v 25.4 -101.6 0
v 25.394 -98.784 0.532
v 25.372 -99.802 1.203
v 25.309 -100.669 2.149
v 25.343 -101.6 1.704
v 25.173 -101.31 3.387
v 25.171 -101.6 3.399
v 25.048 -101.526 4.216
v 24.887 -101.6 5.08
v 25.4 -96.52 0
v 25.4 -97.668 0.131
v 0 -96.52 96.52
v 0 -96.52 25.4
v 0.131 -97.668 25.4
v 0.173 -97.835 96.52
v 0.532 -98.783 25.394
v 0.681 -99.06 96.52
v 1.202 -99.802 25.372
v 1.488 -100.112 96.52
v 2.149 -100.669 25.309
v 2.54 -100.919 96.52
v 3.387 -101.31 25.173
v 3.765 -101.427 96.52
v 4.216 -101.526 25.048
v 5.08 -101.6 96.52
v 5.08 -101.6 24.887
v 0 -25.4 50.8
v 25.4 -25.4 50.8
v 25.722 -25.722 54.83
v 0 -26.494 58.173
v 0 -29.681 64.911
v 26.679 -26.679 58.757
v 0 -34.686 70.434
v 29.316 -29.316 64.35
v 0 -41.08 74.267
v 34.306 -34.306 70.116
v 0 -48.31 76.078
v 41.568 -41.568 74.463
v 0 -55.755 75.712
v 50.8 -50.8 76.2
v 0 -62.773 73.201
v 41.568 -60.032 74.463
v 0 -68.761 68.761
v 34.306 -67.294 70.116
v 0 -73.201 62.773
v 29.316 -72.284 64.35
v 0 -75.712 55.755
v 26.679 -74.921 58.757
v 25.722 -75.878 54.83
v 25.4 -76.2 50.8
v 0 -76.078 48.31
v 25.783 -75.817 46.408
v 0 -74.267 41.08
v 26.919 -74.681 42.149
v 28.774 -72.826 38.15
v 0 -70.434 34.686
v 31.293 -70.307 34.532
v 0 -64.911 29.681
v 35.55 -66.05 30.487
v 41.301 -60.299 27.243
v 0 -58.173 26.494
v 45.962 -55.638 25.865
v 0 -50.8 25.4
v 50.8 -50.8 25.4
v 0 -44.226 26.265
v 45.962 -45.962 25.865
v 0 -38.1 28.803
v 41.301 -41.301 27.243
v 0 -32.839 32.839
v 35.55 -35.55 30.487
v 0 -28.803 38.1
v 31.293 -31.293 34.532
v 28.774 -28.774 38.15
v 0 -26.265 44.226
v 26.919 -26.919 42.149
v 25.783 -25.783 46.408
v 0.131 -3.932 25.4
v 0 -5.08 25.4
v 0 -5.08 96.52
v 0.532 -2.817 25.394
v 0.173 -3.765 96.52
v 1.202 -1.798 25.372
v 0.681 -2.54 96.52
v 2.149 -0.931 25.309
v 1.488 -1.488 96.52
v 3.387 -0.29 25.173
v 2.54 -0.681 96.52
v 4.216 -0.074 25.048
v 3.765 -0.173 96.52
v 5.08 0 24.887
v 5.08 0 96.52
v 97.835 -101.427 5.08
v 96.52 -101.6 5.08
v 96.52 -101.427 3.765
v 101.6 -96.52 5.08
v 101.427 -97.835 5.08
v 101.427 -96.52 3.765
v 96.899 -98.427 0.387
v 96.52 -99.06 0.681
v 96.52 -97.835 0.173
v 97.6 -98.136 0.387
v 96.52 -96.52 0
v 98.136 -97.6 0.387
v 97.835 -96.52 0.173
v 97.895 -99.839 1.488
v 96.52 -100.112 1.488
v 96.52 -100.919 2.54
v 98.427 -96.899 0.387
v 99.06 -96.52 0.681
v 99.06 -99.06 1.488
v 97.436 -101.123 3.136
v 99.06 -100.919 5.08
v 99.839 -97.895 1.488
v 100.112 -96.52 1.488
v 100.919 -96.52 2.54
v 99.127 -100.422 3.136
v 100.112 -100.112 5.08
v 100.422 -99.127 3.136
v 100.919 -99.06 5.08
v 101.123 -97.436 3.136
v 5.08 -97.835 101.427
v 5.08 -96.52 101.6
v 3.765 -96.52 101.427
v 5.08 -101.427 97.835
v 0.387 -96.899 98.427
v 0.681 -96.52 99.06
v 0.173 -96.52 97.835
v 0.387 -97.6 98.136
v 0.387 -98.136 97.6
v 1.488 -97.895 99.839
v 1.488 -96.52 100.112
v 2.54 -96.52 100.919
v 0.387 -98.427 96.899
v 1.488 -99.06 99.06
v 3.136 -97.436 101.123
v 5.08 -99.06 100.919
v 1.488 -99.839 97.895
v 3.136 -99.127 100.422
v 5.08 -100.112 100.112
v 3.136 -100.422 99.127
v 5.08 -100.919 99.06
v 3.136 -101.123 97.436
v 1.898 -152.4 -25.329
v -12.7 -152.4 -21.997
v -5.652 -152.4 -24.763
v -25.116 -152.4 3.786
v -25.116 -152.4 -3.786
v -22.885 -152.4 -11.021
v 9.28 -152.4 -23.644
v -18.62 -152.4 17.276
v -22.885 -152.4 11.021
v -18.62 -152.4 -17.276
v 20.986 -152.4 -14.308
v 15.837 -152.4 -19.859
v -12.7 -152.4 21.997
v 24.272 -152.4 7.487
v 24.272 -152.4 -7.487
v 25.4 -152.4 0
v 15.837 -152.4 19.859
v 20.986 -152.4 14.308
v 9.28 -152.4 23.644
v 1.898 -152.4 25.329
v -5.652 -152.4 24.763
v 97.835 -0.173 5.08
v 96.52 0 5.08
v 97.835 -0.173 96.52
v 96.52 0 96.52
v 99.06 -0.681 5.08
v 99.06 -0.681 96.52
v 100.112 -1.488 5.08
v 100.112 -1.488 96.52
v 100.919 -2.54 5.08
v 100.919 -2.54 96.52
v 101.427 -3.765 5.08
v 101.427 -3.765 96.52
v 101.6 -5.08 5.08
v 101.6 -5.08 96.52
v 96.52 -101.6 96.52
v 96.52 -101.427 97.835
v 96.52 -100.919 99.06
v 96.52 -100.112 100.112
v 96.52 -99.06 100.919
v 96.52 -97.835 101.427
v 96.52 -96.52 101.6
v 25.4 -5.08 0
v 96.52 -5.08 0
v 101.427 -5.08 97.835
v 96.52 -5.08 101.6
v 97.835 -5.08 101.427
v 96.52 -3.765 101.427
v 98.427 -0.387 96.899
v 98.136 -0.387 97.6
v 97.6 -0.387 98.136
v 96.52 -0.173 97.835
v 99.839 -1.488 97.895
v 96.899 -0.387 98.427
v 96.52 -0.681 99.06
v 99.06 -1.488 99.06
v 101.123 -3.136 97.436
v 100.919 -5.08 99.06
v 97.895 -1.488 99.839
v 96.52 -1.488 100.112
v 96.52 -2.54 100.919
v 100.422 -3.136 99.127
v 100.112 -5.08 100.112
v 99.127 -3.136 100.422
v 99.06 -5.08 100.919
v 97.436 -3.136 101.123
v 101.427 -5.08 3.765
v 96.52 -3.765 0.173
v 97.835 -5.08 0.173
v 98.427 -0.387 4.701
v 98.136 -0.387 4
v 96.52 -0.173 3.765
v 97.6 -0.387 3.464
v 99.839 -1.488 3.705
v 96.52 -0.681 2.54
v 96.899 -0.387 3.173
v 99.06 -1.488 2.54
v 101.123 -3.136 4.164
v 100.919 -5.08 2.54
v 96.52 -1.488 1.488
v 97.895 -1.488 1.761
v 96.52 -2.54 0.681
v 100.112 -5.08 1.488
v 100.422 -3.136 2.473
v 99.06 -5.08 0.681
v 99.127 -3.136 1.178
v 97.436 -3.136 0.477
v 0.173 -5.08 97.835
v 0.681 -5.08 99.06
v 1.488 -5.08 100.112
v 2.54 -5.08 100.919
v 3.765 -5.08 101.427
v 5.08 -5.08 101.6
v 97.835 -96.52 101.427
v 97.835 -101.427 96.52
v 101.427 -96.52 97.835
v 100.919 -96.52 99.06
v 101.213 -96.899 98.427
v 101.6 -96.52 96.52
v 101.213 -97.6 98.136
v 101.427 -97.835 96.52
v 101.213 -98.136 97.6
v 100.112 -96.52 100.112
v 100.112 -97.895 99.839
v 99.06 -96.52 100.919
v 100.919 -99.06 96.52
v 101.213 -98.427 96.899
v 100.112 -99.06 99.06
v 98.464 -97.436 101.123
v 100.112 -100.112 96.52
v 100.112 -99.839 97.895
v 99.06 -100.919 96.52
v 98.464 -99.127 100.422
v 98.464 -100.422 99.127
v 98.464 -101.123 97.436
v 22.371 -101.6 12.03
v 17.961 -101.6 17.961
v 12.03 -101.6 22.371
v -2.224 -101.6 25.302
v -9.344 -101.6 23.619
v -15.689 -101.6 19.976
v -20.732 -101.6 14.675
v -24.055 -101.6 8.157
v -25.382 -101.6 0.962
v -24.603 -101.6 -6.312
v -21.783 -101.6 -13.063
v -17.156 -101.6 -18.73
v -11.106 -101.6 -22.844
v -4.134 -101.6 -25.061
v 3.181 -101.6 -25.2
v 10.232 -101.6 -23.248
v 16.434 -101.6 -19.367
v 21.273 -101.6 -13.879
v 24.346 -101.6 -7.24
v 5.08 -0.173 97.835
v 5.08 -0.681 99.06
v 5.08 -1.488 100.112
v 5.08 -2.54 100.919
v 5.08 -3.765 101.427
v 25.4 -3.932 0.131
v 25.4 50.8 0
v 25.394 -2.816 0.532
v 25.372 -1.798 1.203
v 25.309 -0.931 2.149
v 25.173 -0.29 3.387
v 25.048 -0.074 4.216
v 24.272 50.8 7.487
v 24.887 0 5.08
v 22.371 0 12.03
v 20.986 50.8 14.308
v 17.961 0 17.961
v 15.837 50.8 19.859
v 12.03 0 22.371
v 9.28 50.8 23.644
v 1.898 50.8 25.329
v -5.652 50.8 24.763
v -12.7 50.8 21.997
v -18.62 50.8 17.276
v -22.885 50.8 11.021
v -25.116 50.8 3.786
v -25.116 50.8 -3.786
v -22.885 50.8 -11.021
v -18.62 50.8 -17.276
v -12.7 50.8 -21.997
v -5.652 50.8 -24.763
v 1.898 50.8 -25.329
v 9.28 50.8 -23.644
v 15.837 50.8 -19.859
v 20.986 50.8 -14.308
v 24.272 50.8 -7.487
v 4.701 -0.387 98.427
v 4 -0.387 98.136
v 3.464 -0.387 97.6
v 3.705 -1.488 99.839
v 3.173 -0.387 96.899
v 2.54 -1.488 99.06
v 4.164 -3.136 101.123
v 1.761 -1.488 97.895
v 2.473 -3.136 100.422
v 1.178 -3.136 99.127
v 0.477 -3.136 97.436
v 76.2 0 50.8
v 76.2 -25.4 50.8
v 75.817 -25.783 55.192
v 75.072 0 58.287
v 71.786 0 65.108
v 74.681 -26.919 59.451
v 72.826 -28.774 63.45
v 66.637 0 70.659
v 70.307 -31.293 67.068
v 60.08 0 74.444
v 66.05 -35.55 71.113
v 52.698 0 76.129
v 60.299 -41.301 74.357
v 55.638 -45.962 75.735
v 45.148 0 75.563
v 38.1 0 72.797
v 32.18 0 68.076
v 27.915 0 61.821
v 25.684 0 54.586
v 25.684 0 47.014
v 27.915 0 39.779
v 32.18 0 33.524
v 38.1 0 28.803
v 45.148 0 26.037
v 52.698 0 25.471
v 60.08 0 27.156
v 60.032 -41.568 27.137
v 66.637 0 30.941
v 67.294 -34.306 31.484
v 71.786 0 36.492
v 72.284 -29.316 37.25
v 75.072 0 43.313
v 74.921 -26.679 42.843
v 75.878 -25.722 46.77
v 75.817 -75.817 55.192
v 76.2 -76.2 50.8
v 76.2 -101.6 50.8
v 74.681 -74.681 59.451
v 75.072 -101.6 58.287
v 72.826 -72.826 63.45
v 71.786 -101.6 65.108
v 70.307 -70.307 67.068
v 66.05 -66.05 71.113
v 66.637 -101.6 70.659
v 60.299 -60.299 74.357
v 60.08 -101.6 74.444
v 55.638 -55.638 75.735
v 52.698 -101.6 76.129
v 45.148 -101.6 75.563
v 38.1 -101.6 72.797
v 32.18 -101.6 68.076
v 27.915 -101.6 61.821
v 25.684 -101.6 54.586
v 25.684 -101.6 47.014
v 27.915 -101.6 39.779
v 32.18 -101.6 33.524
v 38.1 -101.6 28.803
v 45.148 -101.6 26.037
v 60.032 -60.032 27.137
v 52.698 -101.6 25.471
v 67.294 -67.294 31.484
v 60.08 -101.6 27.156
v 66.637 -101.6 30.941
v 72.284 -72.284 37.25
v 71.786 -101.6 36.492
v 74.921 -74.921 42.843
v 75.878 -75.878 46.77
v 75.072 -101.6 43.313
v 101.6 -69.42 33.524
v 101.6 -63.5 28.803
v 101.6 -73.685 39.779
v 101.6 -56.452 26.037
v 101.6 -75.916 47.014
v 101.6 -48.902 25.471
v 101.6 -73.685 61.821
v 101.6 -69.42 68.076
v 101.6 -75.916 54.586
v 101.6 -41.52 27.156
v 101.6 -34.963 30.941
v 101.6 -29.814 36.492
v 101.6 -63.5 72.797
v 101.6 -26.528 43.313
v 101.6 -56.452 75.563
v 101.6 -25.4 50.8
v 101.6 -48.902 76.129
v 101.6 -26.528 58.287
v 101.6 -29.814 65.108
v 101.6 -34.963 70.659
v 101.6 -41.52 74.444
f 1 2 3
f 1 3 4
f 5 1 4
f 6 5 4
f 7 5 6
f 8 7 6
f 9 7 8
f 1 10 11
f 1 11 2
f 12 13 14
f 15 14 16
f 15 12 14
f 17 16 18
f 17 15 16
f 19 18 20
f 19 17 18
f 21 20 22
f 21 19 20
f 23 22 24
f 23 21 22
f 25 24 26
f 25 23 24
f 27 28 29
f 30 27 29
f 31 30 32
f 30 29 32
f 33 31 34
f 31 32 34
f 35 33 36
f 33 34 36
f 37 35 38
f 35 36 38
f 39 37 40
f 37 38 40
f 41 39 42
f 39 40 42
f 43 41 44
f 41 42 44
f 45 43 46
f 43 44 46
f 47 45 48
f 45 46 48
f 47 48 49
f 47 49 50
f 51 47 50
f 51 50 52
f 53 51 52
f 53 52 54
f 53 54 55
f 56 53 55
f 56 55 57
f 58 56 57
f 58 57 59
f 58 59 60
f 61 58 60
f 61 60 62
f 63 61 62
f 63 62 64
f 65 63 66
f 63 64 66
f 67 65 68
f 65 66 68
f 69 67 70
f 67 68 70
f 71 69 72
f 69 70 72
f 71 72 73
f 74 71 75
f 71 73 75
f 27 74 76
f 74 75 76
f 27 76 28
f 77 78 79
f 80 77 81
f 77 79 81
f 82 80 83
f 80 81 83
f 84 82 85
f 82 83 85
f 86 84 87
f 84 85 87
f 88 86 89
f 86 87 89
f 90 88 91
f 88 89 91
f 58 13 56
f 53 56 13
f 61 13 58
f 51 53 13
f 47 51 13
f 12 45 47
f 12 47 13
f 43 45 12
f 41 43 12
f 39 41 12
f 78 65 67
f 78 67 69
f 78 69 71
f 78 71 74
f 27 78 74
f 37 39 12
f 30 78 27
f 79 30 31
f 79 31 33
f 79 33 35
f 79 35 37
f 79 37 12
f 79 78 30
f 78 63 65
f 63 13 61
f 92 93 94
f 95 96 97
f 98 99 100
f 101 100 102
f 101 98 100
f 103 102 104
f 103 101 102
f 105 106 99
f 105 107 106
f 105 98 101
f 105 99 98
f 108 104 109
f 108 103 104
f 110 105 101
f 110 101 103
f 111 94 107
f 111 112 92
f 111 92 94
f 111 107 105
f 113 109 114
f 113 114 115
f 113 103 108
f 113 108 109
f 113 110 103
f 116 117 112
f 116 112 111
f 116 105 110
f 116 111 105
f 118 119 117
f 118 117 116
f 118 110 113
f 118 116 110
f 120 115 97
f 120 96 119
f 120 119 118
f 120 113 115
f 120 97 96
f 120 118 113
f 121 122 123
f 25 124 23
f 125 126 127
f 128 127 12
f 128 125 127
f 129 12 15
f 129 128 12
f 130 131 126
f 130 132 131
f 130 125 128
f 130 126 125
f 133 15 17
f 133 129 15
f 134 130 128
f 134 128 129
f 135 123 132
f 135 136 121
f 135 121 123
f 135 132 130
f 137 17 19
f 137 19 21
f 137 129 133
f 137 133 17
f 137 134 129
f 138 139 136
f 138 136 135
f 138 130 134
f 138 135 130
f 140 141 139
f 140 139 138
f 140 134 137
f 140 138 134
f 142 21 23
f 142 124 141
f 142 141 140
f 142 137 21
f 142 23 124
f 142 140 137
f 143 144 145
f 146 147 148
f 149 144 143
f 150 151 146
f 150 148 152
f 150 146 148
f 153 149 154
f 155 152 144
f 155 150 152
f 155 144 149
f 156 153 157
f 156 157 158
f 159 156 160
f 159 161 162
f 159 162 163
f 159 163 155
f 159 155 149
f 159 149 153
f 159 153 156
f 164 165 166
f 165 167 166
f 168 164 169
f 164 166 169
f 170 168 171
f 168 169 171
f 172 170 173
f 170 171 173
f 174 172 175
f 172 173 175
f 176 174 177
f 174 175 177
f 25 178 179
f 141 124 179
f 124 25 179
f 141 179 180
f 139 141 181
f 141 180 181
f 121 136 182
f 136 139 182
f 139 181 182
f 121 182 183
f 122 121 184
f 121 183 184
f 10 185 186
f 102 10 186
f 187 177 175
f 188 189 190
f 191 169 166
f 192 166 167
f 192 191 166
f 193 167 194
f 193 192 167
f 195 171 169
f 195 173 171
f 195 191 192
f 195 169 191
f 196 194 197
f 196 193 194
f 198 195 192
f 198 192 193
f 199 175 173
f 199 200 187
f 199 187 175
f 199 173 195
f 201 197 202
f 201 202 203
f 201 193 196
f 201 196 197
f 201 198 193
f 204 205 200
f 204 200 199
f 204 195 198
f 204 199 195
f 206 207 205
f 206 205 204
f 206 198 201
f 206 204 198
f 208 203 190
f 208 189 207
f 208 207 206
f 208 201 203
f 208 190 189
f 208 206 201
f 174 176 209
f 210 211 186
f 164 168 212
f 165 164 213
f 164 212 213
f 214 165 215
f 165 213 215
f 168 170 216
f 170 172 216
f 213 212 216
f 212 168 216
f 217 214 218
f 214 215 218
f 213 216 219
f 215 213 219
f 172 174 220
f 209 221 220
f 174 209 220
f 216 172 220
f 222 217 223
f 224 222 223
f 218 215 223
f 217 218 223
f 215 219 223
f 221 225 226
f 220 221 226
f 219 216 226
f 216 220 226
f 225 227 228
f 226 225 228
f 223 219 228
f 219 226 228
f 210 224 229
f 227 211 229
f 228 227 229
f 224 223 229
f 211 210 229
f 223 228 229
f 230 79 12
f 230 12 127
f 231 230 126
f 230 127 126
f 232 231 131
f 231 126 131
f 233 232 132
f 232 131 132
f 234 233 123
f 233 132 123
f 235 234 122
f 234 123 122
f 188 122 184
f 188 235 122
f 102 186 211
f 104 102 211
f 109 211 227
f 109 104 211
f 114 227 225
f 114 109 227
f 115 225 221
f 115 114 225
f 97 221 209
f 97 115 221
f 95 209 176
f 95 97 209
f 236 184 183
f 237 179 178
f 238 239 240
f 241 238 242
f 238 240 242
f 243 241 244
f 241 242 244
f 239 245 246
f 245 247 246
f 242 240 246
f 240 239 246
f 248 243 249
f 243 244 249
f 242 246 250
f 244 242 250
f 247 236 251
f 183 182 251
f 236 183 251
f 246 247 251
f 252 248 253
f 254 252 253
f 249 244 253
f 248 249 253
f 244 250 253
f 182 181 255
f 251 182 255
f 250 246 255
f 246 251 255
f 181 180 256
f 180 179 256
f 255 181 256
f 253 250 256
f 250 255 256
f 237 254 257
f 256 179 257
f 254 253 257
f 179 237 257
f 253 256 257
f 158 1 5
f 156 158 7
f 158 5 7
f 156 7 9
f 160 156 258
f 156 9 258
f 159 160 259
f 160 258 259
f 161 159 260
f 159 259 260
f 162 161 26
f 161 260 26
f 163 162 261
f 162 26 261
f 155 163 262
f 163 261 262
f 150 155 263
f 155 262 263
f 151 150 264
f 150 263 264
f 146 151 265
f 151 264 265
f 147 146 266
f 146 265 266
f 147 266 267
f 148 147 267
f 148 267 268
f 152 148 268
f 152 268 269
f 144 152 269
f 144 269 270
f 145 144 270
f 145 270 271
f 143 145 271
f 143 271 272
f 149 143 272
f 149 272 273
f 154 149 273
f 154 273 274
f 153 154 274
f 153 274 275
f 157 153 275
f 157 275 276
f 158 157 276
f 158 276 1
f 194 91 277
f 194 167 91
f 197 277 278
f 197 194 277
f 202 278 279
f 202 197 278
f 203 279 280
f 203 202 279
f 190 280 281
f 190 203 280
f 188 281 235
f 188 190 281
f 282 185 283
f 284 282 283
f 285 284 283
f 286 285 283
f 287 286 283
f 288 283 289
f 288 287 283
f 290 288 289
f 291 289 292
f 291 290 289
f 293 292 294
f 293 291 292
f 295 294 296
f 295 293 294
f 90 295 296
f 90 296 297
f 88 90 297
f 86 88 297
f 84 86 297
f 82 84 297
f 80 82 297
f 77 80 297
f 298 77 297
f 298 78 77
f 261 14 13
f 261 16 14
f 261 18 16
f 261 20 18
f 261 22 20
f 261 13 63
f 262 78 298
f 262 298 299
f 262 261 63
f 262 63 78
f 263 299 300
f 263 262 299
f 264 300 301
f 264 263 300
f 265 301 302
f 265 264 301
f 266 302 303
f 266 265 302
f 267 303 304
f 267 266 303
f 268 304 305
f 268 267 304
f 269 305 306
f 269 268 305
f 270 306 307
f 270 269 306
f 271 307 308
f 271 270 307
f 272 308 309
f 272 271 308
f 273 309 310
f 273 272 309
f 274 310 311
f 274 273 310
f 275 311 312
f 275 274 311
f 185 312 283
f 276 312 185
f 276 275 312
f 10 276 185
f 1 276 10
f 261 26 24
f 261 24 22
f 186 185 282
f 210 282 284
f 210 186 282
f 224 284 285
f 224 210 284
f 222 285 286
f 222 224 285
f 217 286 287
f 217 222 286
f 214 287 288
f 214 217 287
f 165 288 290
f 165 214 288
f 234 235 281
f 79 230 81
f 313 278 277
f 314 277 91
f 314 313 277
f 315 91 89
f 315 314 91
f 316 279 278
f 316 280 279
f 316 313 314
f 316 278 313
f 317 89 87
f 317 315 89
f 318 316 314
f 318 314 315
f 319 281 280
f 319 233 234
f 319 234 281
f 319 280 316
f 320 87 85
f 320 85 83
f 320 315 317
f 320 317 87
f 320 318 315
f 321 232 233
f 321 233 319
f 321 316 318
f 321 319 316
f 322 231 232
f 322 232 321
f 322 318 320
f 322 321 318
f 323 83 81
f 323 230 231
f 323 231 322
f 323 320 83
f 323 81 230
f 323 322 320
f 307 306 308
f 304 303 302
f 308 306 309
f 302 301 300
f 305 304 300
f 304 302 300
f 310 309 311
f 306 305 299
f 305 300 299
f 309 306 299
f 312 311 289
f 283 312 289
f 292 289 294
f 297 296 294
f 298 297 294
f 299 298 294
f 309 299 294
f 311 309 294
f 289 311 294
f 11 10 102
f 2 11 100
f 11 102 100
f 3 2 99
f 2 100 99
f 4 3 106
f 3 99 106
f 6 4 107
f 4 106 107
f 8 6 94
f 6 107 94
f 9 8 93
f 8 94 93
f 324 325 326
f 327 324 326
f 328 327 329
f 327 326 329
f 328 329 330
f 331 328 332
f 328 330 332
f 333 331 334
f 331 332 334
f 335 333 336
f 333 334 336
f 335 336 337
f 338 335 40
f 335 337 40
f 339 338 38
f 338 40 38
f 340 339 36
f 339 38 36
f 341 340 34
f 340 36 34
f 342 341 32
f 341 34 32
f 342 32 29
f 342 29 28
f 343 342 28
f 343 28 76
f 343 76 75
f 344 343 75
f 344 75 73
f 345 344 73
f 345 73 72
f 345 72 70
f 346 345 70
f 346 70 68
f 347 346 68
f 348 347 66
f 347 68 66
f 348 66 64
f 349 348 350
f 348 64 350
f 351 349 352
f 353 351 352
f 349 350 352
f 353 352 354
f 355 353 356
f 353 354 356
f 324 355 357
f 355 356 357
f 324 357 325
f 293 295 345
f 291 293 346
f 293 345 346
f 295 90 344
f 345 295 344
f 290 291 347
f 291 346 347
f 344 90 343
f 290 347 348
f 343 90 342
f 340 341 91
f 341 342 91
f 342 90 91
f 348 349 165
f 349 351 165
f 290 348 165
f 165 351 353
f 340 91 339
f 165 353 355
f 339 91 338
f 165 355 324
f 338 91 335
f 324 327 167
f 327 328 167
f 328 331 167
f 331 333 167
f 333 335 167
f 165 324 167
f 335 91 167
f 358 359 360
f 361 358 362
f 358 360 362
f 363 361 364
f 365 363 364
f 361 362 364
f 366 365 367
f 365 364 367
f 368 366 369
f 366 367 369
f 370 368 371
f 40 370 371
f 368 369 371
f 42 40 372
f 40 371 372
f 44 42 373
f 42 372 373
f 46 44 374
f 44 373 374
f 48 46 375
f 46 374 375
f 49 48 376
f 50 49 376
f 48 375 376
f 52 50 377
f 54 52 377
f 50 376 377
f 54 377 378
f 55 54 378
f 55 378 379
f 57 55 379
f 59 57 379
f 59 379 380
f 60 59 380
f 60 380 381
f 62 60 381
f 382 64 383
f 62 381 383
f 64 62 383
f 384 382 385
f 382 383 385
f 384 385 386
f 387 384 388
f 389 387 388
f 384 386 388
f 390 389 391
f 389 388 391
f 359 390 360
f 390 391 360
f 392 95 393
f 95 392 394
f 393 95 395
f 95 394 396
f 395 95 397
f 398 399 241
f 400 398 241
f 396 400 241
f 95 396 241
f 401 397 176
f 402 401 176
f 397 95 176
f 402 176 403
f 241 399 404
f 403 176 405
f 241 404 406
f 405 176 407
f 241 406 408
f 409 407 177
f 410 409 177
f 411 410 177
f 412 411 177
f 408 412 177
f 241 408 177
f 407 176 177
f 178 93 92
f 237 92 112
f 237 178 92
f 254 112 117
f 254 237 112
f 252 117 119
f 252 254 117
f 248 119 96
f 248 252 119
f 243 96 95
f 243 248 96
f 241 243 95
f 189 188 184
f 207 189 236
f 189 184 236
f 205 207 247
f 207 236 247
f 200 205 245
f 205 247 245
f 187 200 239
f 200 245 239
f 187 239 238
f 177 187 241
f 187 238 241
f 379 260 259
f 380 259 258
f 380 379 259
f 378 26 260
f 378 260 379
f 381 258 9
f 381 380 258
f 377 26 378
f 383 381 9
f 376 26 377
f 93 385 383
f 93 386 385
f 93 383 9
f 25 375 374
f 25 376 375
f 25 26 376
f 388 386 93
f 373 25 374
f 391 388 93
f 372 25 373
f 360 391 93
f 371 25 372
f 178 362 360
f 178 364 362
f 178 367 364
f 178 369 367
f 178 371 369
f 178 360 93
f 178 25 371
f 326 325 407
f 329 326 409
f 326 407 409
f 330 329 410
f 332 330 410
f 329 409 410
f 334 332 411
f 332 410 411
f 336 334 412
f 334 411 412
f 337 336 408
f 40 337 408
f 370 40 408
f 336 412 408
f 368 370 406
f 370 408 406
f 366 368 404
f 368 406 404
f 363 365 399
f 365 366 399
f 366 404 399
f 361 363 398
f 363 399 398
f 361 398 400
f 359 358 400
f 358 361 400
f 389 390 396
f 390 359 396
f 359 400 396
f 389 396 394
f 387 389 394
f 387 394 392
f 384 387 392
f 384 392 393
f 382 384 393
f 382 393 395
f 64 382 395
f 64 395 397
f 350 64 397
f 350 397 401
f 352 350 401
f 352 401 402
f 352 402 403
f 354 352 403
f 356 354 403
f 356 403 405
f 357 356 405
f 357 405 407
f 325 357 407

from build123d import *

# Parameters (mm, degrees)
F0_W          = 101.6
F0_H          = 101.6
F1_DEPTH      = 101.6
F2_R          = 25.4
F3_DEPTH      = 101.6
F4_R          = 25.4
F5_DEPTH      = 101.6
F6_R          = 5.08
F8_R          = 25.4
F9_DEPTH      = 50.8
F9_DEPTH_BACK = 152.4


with BuildPart() as f1:
    # F0 (on Front) → F1 (new body)
    with BuildSketch(Plane.XZ):
        with Locations((50.8, 50.8)):
            Rectangle(F0_W, F0_H)
    extrude(amount=F1_DEPTH)

    # F2 (on face) → F3 (cut)
    with BuildSketch(Plane.XZ.offset(101.6)):
        with Locations((50.8, 50.8)):
            Circle(F2_R)
    extrude(amount=-F3_DEPTH, mode=Mode.SUBTRACT)

    # F4 (on face) → F5 (cut)
    with BuildSketch(Plane.YZ.offset(101.6)):
        with Locations((-50.8, 50.8)):
            Circle(F4_R)
    extrude(amount=-F5_DEPTH, mode=Mode.SUBTRACT)

    # F6
    f6_edges = [f1.edges().sort_by_distance(p)[0] for p in [
        (50.8, -101.6, 101.6),
        (101.6, -50.8, 101.6),
        (101.6, -101.6, 50.8),
        (50.8, -101.6, 0),
        (101.6, -50.8, 0),
        (101.6, 0, 50.8),
        (0, -50.8, 101.6),
        (50.8, 0, 101.6),
        (0, -50.8, 0),
        (50.8, 0, 0),
        (0, -101.6, 50.8),
        (0, 0, 50.8),
    ]]
    fillet(f6_edges, radius=F6_R)

    # F8 (on offset) → F9 (join, two sides)
    with BuildSketch(Plane.XZ.offset(101.6)) as f9_sk:
        Circle(F8_R)
    extrude(amount=F9_DEPTH)
    extrude(f9_sk.sketch, amount=-F9_DEPTH_BACK)


solid = f1.part
